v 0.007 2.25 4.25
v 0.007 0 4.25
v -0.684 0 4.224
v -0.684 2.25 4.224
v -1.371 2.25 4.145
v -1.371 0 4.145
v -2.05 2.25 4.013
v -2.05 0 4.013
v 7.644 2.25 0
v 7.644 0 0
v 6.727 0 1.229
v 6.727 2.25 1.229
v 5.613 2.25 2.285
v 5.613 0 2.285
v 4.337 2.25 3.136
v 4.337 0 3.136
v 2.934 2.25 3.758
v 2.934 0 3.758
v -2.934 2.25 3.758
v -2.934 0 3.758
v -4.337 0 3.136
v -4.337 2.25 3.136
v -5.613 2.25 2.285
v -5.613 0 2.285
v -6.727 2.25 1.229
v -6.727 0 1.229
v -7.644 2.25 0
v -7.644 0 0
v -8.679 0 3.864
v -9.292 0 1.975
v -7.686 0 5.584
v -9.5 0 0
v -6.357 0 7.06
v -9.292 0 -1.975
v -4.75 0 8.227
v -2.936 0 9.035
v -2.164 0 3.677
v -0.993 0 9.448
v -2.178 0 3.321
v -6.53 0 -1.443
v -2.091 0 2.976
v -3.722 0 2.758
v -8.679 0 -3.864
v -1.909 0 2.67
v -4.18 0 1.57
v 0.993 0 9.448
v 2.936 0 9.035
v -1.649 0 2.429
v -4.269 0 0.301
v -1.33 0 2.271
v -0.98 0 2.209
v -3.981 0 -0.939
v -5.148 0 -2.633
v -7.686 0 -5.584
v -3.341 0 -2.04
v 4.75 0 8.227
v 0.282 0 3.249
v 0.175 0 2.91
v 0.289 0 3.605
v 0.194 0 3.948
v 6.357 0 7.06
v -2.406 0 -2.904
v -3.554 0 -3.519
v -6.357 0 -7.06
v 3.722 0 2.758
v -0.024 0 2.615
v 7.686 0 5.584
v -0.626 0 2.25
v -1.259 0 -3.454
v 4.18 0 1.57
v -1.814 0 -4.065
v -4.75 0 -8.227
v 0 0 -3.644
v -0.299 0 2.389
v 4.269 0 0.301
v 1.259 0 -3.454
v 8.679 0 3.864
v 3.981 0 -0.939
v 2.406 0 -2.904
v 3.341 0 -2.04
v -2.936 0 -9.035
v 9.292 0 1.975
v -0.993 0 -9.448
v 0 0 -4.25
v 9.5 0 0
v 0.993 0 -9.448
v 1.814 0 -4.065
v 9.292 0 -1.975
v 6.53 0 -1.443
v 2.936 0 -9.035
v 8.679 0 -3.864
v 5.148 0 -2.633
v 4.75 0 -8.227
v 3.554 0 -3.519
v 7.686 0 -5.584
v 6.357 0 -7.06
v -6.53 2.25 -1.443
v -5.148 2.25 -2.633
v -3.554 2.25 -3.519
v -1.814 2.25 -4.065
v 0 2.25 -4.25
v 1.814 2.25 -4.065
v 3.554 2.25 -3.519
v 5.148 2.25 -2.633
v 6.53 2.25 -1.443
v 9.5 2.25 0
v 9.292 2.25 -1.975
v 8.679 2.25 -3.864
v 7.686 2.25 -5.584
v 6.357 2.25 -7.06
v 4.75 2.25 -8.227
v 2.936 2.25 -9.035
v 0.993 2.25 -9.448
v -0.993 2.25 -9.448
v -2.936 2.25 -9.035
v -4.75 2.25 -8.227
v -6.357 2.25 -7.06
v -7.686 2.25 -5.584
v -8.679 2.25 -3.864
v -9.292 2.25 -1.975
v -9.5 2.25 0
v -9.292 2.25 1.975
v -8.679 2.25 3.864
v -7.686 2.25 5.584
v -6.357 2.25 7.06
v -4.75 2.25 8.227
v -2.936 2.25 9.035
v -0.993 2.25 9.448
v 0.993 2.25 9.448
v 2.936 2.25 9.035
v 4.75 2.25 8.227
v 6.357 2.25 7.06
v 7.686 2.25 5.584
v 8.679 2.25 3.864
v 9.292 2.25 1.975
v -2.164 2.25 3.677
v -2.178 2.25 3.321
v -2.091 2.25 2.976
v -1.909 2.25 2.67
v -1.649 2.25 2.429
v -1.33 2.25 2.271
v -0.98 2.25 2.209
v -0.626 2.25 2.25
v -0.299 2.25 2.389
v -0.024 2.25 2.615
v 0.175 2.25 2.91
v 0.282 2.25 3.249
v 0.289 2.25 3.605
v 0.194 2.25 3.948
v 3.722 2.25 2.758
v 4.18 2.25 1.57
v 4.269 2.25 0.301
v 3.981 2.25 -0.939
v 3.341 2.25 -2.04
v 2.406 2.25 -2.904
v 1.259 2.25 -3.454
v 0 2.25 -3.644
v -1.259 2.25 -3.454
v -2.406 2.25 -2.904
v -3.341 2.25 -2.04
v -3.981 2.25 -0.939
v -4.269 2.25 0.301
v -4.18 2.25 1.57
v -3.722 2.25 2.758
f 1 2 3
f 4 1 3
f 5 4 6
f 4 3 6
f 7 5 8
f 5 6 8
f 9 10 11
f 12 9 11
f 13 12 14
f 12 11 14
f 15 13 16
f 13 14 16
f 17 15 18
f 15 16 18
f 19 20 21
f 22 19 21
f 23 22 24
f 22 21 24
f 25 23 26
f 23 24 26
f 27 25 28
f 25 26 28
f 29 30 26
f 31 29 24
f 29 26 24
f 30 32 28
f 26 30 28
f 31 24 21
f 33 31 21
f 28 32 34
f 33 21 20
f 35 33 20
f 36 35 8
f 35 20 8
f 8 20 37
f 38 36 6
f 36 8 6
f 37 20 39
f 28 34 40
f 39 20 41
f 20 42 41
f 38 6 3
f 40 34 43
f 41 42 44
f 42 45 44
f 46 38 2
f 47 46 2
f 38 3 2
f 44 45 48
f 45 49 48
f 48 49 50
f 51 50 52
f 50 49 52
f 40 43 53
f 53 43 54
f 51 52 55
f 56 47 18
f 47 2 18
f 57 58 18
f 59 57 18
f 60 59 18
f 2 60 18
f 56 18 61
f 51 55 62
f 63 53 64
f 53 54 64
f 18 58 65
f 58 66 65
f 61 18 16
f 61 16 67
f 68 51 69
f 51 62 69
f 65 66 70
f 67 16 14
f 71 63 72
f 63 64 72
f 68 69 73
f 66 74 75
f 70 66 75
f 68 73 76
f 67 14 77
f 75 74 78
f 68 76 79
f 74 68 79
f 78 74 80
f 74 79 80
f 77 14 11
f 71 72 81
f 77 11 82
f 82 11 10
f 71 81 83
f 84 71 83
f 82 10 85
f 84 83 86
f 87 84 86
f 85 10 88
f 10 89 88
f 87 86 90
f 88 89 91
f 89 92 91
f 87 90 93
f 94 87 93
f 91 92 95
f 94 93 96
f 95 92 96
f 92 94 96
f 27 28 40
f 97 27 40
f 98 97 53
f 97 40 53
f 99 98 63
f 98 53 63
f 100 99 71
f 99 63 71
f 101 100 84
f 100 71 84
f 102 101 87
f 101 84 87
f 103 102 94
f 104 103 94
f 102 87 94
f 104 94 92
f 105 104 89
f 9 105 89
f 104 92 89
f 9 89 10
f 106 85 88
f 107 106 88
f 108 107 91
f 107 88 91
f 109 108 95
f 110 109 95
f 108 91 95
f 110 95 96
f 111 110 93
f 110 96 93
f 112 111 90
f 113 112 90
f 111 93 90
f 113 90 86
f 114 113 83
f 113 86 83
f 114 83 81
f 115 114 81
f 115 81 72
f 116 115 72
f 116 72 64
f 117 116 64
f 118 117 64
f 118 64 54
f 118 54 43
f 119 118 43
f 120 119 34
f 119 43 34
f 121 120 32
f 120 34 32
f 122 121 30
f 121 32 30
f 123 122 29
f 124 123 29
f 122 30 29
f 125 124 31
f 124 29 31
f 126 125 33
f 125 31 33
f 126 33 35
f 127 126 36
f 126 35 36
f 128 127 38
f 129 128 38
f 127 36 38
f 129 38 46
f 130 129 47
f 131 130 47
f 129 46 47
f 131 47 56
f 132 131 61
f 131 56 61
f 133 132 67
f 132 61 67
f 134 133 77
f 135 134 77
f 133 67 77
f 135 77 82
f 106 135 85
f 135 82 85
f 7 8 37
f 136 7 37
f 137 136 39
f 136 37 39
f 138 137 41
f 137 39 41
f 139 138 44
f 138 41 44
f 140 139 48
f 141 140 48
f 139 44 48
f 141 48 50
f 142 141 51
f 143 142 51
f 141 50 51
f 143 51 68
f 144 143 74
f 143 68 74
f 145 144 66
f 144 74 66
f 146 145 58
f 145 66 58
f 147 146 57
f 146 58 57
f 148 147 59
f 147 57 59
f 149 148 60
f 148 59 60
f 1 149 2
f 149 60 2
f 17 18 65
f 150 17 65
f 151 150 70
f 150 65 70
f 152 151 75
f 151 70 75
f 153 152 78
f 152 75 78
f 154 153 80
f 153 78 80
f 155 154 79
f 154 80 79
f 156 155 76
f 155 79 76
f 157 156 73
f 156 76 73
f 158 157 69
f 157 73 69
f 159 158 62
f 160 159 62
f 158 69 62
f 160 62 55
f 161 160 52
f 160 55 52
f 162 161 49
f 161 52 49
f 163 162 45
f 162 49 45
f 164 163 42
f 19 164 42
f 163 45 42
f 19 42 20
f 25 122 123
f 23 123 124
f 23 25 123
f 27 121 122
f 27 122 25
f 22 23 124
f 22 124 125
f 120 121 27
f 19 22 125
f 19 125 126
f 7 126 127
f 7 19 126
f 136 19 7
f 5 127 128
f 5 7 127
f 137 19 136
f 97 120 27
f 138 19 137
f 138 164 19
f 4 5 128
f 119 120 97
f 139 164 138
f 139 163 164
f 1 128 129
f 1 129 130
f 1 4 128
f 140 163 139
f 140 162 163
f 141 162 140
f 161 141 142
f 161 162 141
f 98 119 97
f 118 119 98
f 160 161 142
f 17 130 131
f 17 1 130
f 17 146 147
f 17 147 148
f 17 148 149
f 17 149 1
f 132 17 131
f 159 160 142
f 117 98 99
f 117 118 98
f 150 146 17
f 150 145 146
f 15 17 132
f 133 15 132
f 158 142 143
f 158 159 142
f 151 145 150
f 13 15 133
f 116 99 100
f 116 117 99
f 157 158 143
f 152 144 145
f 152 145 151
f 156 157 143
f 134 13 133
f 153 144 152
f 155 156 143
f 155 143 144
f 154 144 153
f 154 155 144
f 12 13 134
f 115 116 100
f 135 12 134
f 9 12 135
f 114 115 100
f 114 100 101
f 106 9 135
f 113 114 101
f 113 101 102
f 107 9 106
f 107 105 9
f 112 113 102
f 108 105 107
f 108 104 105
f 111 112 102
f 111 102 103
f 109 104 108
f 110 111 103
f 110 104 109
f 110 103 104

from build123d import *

# Parameters (mm, degrees)
SKETCH1_R           = 9.5
BOSS_EXTRUDE1_DEPTH = 2.25


with BuildPart() as part:
    # Sketch1 → Boss-Extrude1 (new body)
    with BuildSketch(Plane(origin=(0, 0, 0), x_dir=(1, 0, 0), z_dir=(0, 1, 0))):
        Circle(SKETCH1_R)
        with BuildLine():
            ThreePointArc((-2.050056302, -4.013405112), (-0.801449739, -2.21696931), (0.006631996, -4.249997556))
            ThreePointArc((0.006631996, -4.249997556), (-1.028537661, -4.191035191), (-2.050056302, -4.013405112))
        make_face(mode=Mode.SUBTRACT)
        with BuildLine():
            ThreePointArc((7.644442426, 0), (5.613326884, -2.284952828), (2.934499964, -3.758155497))
            ThreePointArc((2.934499964, -3.758155497), (0, 3.643549808), (-2.934499964, -3.758155497))
            ThreePointArc((-2.934499964, -3.758155497), (-5.613326884, -2.284952828), (-7.644442426, 0))
            ThreePointArc((-7.644442426, 0), (0, 4.25), (7.644442426, 0))
        make_face(mode=Mode.SUBTRACT)
    extrude(amount=BOSS_EXTRUDE1_DEPTH)


solid = part.part
